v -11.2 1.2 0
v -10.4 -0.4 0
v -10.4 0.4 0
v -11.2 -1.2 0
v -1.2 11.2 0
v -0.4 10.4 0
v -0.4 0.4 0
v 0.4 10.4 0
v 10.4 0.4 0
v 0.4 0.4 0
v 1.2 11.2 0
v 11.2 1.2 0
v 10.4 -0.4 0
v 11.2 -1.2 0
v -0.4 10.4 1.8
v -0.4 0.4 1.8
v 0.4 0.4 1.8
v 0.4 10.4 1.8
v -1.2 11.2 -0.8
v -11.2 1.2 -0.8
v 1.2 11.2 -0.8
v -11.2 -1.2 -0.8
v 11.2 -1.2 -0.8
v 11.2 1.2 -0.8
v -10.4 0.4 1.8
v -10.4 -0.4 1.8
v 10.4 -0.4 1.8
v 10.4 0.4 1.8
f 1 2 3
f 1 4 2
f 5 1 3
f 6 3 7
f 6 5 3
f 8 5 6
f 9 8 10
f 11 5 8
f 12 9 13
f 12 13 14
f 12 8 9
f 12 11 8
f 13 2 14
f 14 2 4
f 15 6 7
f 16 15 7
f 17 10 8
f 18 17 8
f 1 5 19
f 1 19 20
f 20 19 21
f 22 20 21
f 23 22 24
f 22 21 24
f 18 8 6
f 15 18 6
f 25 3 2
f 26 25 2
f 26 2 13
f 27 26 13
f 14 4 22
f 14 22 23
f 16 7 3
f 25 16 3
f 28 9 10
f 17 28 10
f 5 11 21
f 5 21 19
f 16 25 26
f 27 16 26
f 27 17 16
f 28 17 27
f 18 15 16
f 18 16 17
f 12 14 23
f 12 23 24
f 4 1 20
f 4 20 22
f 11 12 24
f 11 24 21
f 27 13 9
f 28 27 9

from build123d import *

# Parameters (mm, degrees)
F1_DEPTH = 1.8
F0_W     = 0.8
F0_H     = 0.8
F2_DEPTH = 0.8


with BuildPart() as f1:
    # F0 (on Top) → F1 (new body)
    with BuildSketch(Plane.XY):
        Polygon((-0.4, 10.4), (-0.4, 0.4), (-10.4, 0.4), (-10.4, -0.4), (-0.4, -0.4), (0.4, -0.4), (10.4, -0.4), (10.4, 0.4), (0.4, 0.4), (0.4, 10.4), align=None)
    extrude(amount=F1_DEPTH)

    # F0 (on Top) + F1_face (on face) → F2 (join)
    with BuildSketch(Plane.XY):
        Polygon((-1.2, 11.2), (-11.2, 1.2), (-1.2, 1.2), align=None)
        Polygon((1.2, 1.2), (11.2, 1.2), (1.2, 11.2), align=None)
        Polygon((-10.4, 0.4), (-0.4, 0.4), (-0.4, 10.4), (0.4, 10.4), (0.4, 0.4), (10.4, 0.4), (10.4, -0.4), (0.4, -0.4), (0.4, -1.2), (1.2, -1.2), (11.2, -1.2), (11.2, 1.2), (1.2, 1.2), (1.2, 11.2), (-1.2, 11.2), (-1.2, 1.2), (-11.2, 1.2), (-11.2, -1.2), (-1.2, -1.2), (-0.4, -1.2), (-0.4, -0.4), (-10.4, -0.4), align=None)
        Polygon((-0.4, 10.4), (-0.4, 0.4), (-10.4, 0.4), (-10.4, -0.4), (-0.4, -0.4), (0.4, -0.4), (10.4, -0.4), (10.4, 0.4), (0.4, 0.4), (0.4, 10.4), align=None)
        with Locations((0, -0.8)):
            Rectangle(F0_W, F0_H)
    with BuildSketch(Plane(origin=(0, 1.7532467532, 1.8), x_dir=(1, 0, 0), z_dir=(0, 0, 1))):
        Polygon((0.4, -1.3532467532), (0.4, 8.6467532468), (-0.4, 8.6467532468), (-0.4, -1.3532467532), (-10.4, -1.3532467532), (-10.4, -2.1532467532), (10.4, -2.1532467532), (10.4, -1.3532467532), align=None)
    extrude(amount=-F2_DEPTH)


solid = f1.part
